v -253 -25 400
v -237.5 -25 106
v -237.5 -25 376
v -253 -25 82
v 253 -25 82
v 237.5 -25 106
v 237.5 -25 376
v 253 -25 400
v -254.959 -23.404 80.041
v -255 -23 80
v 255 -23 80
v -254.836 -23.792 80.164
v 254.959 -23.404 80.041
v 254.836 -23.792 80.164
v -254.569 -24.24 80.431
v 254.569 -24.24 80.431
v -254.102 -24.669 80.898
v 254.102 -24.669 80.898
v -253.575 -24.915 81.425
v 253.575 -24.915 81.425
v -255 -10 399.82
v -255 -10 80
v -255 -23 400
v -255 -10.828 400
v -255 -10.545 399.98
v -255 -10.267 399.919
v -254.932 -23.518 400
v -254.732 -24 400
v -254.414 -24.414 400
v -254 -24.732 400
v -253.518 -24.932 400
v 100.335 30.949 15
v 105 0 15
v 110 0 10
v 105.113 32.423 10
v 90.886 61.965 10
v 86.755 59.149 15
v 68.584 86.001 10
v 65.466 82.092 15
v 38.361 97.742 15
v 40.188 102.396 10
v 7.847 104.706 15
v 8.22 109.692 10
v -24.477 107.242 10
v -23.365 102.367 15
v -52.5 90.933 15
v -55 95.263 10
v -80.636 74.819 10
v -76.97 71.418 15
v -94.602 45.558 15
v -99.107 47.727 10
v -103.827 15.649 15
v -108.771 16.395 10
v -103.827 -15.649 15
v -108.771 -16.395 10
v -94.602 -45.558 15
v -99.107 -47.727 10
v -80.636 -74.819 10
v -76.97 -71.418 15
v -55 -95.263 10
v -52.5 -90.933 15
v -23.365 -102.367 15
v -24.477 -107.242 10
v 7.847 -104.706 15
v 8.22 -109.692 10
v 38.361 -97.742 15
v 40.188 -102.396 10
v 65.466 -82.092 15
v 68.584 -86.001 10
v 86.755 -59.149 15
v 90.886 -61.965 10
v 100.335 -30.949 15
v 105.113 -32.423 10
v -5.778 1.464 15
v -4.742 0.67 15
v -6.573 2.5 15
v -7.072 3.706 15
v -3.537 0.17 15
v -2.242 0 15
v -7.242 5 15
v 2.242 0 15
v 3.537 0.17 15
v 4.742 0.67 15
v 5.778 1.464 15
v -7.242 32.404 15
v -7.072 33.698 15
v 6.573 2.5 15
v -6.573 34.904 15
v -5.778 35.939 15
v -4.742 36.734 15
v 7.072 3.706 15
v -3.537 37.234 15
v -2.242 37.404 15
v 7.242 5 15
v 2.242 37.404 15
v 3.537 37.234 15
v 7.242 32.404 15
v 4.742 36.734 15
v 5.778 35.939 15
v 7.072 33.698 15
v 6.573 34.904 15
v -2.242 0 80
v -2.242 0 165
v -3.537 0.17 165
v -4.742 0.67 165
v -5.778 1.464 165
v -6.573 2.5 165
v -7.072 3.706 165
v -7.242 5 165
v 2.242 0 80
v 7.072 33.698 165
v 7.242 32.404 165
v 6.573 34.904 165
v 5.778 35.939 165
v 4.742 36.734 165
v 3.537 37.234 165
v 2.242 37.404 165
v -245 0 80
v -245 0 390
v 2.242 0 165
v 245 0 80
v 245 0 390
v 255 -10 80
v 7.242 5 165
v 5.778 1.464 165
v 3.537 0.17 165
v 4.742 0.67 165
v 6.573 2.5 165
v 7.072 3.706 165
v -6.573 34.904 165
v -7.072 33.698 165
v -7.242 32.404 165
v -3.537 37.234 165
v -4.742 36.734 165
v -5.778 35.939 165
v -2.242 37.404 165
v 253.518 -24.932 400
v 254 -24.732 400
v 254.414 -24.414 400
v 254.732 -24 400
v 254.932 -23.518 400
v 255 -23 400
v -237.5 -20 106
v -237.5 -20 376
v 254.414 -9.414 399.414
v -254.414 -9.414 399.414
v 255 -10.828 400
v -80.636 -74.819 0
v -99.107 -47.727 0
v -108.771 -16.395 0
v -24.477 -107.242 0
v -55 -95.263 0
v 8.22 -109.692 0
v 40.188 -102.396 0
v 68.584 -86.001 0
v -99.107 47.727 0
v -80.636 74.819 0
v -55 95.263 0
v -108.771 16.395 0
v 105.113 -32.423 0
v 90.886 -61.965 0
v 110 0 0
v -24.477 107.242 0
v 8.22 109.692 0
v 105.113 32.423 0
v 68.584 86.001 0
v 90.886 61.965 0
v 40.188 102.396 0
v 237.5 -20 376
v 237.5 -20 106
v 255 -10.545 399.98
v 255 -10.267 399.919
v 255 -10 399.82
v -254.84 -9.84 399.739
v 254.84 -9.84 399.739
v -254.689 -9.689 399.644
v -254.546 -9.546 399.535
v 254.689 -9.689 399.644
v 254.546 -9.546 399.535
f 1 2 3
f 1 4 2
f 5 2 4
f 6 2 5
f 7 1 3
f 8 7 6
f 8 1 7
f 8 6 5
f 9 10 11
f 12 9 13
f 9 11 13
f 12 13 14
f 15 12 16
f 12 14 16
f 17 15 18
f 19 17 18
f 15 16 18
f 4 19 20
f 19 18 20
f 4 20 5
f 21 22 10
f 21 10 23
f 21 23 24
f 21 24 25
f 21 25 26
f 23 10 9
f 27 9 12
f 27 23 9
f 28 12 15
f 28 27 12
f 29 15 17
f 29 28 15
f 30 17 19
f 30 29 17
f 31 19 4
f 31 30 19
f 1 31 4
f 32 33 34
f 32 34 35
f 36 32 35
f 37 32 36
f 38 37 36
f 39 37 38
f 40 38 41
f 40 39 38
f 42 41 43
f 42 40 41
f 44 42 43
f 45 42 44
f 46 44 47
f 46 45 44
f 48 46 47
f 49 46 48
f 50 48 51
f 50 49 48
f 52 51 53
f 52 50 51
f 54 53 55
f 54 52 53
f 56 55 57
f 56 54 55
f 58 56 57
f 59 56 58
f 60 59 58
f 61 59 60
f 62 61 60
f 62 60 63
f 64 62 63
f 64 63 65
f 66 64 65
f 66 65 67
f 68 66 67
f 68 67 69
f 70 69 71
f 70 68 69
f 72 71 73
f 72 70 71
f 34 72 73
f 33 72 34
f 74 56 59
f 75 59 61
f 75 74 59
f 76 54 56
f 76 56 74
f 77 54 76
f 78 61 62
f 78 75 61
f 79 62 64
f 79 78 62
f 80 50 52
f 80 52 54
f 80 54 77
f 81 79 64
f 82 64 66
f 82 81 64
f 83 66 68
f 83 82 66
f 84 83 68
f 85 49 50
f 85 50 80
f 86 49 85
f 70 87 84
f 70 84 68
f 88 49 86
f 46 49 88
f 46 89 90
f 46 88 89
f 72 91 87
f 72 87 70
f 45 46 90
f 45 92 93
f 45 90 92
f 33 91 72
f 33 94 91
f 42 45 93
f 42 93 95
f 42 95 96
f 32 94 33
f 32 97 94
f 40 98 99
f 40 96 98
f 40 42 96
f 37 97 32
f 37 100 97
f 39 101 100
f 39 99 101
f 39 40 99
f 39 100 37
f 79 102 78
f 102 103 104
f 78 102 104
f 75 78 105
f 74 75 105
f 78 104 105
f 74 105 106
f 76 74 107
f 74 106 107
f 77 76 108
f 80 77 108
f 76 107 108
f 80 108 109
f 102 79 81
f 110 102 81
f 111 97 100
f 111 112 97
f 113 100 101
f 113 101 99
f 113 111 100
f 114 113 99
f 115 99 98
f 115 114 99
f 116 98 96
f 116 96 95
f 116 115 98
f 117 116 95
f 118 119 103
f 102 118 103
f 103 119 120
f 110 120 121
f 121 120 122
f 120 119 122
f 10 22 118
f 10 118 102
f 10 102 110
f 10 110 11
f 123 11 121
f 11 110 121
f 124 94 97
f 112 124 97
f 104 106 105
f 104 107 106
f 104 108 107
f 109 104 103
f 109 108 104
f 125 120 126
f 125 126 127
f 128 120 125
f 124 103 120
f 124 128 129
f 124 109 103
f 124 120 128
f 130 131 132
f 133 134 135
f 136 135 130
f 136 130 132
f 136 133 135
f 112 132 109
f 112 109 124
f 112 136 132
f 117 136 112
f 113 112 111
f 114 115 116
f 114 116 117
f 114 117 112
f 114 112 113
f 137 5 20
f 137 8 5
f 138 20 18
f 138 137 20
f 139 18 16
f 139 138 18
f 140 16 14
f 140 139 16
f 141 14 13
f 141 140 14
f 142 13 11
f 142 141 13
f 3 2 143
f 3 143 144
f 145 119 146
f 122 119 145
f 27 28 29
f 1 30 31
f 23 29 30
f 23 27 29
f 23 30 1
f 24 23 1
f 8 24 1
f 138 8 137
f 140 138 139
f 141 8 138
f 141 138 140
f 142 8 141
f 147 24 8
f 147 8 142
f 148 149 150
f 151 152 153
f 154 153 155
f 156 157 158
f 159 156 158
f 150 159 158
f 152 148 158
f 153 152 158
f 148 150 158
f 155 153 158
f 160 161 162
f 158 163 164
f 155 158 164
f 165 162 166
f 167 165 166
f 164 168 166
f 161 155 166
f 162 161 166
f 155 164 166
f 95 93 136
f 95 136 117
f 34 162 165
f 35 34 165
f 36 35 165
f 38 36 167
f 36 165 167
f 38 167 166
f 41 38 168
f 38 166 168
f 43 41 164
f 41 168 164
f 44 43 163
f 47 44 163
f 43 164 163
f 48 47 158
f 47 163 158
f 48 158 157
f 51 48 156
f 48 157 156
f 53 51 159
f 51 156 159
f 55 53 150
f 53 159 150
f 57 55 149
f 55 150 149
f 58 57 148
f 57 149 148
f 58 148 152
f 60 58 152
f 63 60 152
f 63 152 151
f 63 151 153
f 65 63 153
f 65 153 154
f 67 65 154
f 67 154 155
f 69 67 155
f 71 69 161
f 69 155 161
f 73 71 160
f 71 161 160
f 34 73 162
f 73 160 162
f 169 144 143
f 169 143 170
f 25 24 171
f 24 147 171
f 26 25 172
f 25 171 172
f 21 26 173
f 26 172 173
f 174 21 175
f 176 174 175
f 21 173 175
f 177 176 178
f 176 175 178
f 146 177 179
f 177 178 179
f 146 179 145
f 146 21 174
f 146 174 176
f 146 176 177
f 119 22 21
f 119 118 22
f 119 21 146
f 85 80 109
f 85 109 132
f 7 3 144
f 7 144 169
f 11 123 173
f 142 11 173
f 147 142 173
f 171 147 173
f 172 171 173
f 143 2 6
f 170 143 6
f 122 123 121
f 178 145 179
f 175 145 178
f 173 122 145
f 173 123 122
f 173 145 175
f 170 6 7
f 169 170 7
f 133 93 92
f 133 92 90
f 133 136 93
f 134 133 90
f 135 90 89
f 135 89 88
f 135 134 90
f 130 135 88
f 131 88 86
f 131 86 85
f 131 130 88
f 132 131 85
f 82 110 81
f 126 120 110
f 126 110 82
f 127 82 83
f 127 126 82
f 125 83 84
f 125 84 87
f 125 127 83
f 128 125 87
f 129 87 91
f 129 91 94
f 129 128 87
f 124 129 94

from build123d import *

# Parameters (mm, degrees)
F0_R      = 110
F1_DEPTH  = 15
F2_SIZE   = 5
F3_W      = 14.4848674536
F3_H      = 37.4039579183
F4_DEPTH  = 150
F5_R      = 5
F6_W      = 510
F6_H      = 320
F7_DEPTH  = 25
F8_SIZE   = 10
F9_R      = 2
F10_W     = 475
F10_H     = 270
F11_DEPTH = 5


with BuildPart() as f1:
    # F0 (on Top) → F1 (new body)
    with BuildSketch(Plane.XY):
        Circle(F0_R)
    extrude(amount=F1_DEPTH)

    # F2
    f2_edges = [f1.edges().sort_by_distance(p)[0] for p in [
        (-110, 0, 15),
    ]]
    chamfer(f2_edges, length=F2_SIZE)

    # F3 (on face) → F4 (join)
    with BuildSketch(Plane.XY.offset(15)):
        with Locations((0, 18.7019798905)):
            Rectangle(F3_W, F3_H)
    extrude(amount=F4_DEPTH)

    # F5
    f5_edges = [f1.edges().sort_by_distance(p)[0] for p in [
        (-7.242434, 1e-06, 90),
        (7.242434, 1e-06, 90),
        (7.242434, 37.403959, 90),
        (-7.242434, 37.403959, 90),
    ]]
    fillet(f5_edges, radius=F5_R)

    # F6 (on face) → F7 (join)
    with BuildSketch(Plane.XZ.offset(-9.313e-07)):
        with Locations((0, 240)):
            Rectangle(F6_W, F6_H)
    extrude(amount=F7_DEPTH)

    # F8
    f8_edges = [f1.edges().sort_by_distance(p)[0] for p in [
        (-255, 1e-06, 240),
        (0, 1e-06, 400),
        (255, 1e-06, 240),
    ]]
    chamfer(f8_edges, length=F8_SIZE)

    # F9
    f9_edges = [f1.edges().sort_by_distance(p)[0] for p in [
        (-255, -24.999999, 240),
        (0, -24.999999, 80),
        (255, -24.999999, 240),
        (0, -9.999999, 400),
    ]]
    fillet(f9_edges, radius=F9_R)

    # F10 (on face) → F11 (cut)
    with BuildSketch(Plane.XZ.offset(24.9999990687)):
        with Locations((0, 241)):
            Rectangle(F10_W, F10_H)
    extrude(amount=-F11_DEPTH, mode=Mode.SUBTRACT)


solid = f1.part
